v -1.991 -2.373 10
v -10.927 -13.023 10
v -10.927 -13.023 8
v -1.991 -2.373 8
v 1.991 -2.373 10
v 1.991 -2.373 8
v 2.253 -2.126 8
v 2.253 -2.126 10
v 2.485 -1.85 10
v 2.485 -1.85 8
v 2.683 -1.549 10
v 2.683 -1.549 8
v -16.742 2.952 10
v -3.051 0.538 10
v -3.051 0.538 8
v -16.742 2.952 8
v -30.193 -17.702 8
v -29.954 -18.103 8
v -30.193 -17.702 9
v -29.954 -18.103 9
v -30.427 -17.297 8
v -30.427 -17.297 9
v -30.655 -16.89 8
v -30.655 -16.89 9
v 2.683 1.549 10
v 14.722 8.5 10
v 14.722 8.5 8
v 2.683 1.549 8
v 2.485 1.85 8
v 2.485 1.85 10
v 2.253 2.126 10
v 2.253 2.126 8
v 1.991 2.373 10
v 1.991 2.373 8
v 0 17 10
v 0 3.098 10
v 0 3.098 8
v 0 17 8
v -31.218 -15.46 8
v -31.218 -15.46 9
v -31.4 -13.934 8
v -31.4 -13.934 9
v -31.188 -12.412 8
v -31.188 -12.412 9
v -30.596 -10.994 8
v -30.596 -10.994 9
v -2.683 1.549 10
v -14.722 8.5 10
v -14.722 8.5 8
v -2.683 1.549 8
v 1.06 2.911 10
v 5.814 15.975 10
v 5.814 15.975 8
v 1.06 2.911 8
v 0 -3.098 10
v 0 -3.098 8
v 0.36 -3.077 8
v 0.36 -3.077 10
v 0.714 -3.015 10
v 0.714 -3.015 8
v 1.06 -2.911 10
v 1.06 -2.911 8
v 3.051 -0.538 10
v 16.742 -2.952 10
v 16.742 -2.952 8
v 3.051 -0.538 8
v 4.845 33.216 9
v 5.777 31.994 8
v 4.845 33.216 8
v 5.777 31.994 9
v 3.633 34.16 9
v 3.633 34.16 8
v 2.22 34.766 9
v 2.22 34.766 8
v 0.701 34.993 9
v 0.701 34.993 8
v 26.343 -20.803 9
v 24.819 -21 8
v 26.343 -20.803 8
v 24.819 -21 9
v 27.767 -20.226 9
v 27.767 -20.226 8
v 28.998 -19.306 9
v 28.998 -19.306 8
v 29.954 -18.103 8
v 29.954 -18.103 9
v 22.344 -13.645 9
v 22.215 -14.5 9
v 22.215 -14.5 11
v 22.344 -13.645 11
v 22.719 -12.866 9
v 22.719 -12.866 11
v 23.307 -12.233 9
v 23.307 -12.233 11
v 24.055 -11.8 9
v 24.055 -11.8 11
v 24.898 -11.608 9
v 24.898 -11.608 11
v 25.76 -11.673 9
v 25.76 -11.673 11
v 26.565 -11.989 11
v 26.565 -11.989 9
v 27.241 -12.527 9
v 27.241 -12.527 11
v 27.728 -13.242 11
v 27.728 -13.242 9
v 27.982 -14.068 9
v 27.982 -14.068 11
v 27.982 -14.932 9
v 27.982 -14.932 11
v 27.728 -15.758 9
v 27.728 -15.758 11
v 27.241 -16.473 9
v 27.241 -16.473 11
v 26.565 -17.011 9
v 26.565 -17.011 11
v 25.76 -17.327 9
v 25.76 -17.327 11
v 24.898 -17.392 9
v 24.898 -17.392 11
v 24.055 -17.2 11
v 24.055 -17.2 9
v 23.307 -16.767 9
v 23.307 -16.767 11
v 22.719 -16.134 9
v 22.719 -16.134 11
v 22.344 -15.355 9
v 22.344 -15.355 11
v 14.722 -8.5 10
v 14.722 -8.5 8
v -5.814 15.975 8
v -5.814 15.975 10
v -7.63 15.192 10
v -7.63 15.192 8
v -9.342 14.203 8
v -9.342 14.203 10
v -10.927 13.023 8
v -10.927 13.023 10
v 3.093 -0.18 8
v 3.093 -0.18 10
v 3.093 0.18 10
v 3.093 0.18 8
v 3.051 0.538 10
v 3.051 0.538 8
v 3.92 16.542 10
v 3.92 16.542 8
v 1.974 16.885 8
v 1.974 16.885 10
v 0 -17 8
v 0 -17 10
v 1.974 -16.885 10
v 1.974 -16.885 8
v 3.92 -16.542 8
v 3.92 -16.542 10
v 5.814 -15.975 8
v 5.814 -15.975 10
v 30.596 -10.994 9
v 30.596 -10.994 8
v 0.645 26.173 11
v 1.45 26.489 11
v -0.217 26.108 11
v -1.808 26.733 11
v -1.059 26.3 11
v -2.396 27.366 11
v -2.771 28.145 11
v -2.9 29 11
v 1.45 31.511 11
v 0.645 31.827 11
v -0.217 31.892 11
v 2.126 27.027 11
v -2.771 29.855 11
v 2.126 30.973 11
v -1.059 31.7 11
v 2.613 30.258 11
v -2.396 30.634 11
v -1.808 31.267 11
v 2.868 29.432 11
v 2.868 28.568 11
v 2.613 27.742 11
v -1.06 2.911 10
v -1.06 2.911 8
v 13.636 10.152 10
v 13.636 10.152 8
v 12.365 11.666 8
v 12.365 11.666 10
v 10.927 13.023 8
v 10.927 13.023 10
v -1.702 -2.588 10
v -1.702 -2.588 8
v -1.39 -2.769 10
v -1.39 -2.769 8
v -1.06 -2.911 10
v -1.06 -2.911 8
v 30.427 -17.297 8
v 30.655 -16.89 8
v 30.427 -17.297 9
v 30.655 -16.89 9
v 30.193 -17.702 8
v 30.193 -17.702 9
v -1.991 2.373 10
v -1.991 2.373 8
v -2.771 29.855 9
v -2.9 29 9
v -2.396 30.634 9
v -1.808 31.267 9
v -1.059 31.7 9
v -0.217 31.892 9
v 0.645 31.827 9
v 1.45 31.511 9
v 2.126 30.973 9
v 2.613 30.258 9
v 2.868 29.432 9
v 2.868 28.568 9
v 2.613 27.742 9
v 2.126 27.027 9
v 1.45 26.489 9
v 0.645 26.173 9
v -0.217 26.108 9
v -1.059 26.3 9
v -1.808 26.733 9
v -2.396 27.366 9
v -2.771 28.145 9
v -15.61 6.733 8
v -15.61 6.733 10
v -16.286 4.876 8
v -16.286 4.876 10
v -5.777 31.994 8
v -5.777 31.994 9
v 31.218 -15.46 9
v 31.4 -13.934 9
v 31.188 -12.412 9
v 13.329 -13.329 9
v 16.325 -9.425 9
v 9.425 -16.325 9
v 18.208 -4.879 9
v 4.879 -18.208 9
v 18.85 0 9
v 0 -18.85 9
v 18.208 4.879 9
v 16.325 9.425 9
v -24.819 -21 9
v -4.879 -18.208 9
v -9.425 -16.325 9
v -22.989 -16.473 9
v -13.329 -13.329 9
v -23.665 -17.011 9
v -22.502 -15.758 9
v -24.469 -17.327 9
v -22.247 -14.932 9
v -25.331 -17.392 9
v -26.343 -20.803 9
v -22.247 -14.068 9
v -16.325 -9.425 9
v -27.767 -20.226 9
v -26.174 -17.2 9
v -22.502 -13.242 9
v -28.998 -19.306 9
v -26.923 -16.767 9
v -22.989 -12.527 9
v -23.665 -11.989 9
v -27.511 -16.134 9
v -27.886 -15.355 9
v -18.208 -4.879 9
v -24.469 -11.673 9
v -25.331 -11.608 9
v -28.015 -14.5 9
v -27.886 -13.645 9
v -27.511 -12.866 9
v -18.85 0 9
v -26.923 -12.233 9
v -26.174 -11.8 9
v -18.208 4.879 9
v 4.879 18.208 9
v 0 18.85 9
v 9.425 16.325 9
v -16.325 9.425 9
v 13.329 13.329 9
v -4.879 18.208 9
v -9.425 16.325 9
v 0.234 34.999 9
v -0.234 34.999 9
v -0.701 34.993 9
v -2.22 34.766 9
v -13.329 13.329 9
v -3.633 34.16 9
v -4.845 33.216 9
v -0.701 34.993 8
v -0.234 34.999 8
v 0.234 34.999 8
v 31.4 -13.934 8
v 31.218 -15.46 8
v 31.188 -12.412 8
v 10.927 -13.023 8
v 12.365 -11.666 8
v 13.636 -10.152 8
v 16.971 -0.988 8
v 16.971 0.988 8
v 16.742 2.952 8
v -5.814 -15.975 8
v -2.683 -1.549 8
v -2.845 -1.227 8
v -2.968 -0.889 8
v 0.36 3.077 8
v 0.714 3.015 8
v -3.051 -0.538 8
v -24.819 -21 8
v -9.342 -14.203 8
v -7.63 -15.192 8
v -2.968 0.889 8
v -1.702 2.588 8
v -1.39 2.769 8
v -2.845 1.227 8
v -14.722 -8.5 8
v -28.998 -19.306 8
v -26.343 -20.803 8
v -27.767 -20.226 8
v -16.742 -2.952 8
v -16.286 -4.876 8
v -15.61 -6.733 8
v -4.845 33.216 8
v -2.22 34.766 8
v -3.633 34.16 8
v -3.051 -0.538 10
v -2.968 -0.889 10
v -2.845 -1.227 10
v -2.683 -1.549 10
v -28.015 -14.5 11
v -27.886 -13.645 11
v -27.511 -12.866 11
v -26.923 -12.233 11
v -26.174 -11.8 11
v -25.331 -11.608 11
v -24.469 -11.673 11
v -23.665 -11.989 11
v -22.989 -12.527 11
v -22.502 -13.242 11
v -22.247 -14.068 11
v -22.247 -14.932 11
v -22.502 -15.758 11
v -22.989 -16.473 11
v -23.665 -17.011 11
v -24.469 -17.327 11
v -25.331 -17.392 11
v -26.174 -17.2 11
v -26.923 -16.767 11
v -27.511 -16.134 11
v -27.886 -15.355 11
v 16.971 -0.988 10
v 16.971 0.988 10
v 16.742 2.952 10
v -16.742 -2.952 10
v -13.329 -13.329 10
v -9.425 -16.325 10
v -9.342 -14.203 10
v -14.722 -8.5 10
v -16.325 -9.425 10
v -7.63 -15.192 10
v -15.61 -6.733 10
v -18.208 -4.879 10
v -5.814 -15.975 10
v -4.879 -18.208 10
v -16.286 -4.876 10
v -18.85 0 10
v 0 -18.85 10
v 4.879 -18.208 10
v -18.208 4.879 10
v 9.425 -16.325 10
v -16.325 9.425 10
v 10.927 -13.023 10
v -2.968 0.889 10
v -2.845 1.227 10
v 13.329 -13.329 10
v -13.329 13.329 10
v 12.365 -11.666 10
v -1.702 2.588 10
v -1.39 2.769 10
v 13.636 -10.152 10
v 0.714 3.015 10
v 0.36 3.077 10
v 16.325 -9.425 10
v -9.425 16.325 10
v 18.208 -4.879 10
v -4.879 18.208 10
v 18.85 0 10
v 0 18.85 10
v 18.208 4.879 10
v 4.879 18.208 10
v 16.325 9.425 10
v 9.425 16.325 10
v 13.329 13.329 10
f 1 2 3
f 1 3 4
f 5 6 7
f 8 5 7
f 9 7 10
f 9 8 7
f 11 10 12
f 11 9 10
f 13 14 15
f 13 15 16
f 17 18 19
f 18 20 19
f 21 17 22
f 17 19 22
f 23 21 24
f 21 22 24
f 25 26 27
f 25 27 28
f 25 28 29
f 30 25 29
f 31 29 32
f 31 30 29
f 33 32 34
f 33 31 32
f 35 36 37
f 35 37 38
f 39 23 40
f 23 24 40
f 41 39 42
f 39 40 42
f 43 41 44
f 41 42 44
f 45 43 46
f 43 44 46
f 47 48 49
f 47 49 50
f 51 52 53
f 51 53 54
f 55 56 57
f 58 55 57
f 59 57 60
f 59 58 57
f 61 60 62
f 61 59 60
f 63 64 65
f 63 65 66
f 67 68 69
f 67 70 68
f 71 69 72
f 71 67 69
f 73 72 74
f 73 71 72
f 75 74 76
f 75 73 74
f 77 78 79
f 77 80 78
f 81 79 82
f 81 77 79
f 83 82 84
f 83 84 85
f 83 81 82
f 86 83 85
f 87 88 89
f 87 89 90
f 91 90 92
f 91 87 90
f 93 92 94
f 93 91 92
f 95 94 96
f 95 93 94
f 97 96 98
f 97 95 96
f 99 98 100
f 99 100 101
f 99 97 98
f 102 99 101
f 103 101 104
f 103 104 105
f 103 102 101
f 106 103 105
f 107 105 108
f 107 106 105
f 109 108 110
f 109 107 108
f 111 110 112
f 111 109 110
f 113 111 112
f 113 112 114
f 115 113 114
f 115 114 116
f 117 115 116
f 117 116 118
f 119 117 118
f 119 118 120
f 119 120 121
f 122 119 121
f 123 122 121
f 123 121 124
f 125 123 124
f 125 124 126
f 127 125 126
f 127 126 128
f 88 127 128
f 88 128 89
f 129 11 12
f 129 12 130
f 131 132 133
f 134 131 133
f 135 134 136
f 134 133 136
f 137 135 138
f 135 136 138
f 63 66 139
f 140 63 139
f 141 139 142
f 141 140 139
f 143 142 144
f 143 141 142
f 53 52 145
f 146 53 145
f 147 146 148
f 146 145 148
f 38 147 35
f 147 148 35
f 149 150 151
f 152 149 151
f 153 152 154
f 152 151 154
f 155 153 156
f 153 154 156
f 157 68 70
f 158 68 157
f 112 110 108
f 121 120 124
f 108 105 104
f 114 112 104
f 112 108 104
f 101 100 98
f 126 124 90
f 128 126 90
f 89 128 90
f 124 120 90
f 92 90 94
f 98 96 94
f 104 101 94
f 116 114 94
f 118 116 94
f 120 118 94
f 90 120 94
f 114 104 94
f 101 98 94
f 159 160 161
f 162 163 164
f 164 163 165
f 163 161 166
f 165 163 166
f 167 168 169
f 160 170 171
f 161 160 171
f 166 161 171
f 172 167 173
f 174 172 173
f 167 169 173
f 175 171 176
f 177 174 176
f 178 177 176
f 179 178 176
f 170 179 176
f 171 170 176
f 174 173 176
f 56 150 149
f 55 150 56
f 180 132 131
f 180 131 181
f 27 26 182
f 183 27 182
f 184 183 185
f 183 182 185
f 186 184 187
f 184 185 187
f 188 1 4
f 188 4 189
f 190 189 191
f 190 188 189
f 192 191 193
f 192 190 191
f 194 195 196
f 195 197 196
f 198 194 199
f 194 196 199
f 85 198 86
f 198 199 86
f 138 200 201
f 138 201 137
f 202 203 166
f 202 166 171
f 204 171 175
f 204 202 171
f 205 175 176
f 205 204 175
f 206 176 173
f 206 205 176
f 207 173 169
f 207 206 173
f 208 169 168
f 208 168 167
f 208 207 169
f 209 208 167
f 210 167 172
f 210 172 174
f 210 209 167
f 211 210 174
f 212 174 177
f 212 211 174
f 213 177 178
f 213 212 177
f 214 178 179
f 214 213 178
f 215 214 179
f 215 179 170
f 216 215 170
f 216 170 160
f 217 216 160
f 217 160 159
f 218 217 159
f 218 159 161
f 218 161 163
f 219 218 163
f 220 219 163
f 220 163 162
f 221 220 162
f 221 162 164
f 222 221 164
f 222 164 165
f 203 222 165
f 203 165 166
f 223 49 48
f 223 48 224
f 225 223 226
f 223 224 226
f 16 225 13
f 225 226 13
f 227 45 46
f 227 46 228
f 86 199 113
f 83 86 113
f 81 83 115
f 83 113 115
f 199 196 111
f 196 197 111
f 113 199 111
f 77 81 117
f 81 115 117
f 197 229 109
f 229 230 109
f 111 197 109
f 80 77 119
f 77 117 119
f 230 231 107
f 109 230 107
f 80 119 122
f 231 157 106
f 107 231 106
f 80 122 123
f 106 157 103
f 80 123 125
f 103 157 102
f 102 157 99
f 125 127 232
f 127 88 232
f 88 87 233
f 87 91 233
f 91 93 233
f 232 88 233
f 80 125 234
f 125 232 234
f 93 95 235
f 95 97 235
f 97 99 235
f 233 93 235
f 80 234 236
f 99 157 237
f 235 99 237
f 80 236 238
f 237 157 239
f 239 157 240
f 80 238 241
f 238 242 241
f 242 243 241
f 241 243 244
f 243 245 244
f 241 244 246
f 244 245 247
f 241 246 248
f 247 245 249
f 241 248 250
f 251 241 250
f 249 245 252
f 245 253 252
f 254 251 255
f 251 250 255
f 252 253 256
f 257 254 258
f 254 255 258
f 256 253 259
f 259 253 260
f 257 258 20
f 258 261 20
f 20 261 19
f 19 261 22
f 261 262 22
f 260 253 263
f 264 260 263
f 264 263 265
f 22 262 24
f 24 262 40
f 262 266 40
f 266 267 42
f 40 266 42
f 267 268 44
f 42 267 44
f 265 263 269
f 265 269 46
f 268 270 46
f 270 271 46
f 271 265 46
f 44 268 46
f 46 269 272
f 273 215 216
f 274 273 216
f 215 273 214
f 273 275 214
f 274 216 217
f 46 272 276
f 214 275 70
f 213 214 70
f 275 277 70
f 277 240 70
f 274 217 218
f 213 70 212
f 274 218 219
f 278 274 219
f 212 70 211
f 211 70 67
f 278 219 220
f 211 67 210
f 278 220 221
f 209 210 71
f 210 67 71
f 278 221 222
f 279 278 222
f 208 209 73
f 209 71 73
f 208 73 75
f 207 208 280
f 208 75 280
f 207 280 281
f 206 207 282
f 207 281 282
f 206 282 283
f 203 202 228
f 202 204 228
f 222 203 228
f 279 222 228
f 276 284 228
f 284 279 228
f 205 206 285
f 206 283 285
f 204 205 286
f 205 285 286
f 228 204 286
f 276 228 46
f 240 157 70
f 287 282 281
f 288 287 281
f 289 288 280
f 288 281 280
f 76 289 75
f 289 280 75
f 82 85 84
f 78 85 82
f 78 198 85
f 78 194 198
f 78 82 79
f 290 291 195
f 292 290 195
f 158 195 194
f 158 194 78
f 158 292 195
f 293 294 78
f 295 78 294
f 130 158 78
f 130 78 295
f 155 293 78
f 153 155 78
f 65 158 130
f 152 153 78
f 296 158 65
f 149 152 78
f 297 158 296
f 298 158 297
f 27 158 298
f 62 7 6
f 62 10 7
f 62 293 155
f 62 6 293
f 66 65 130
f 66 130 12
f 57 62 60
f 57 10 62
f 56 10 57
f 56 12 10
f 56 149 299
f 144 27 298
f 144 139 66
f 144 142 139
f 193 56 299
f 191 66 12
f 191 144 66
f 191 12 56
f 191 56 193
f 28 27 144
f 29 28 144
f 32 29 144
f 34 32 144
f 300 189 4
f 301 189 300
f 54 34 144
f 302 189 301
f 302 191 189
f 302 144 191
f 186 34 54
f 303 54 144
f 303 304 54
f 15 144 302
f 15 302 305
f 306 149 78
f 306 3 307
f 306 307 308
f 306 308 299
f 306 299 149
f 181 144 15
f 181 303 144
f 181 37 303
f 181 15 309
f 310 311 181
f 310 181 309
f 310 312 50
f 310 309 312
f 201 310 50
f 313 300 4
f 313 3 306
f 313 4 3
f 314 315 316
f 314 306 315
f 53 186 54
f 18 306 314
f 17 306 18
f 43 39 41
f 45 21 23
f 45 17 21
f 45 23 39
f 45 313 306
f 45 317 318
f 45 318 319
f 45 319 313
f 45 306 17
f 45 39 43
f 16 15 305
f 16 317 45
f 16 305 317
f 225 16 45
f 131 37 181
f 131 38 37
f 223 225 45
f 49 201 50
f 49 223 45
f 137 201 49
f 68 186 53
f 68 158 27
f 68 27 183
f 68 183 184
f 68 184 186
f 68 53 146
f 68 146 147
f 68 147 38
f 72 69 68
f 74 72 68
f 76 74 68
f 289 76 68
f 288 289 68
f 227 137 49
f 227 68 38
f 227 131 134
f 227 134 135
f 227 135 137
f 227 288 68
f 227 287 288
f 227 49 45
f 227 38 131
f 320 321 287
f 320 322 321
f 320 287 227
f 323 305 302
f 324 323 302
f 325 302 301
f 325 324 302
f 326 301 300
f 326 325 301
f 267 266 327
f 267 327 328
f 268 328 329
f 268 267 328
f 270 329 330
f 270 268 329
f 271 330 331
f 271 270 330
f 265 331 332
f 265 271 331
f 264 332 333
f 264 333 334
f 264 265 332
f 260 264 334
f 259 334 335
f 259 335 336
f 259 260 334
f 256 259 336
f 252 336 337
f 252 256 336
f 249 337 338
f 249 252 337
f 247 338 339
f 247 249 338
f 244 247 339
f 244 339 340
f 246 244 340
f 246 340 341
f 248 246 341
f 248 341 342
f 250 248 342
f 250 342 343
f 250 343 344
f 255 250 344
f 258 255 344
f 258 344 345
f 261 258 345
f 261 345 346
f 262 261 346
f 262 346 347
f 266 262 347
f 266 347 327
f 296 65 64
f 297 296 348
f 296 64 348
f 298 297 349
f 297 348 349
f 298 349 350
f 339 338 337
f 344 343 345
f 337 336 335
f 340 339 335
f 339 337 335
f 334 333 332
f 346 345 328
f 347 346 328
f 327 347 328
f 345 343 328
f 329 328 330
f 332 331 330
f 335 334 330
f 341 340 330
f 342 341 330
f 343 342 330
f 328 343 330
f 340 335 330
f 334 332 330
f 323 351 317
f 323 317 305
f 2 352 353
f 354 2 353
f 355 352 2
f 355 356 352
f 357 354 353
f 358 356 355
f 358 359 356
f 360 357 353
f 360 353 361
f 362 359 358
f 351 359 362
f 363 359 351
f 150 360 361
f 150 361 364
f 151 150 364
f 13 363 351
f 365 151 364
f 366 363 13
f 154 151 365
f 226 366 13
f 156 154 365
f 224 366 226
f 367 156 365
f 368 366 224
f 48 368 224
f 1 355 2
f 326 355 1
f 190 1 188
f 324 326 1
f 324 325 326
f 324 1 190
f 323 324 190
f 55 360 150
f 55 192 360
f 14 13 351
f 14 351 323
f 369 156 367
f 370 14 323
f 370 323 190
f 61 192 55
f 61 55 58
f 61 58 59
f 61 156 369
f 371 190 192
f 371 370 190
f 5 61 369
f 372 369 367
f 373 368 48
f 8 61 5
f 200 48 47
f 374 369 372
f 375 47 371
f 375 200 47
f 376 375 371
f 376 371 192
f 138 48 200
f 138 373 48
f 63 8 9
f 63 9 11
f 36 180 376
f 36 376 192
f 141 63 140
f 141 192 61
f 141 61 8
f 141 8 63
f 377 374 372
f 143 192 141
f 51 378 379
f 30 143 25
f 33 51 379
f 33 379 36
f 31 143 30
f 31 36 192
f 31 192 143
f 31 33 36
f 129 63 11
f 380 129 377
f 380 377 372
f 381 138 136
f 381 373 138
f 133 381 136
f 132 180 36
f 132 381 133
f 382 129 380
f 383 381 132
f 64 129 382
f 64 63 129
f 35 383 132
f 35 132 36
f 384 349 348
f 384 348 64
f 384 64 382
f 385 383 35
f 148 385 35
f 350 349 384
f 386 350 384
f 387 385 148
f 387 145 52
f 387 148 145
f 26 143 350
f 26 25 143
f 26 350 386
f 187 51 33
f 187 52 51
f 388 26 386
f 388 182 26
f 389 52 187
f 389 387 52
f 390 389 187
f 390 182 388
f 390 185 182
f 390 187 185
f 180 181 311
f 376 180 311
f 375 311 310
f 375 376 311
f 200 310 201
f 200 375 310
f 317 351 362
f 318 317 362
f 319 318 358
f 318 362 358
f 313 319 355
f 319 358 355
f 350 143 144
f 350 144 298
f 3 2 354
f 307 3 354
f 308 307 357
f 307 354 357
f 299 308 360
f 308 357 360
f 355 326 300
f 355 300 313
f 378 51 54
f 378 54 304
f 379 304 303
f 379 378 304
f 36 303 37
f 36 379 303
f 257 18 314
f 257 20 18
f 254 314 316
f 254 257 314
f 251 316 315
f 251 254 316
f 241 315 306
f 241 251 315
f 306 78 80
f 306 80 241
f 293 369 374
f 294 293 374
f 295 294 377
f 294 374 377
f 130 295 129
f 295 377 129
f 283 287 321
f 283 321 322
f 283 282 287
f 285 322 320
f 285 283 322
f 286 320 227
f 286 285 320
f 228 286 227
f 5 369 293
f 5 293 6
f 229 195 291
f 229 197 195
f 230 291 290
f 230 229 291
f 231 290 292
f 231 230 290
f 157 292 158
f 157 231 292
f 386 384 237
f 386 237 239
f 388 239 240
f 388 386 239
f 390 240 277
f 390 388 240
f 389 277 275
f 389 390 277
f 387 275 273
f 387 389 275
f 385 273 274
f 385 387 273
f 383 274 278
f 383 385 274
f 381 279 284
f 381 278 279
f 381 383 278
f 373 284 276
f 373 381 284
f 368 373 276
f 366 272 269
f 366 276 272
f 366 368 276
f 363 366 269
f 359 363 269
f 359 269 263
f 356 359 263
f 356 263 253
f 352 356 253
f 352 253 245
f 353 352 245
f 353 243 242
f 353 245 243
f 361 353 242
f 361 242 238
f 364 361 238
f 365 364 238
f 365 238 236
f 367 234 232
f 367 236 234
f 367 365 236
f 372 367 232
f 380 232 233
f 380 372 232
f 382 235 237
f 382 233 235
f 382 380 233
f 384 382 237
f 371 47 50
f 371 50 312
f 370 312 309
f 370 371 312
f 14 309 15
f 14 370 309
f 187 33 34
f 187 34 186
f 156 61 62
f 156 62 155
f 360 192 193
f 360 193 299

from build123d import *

# Parameters (mm, degrees)
SKETCH2_R           = 18.85
SKETCH2_R_2         = 17
BOSS_EXTRUDE1_DEPTH = 2
SKETCH9_R           = 3.098061326
BOSS_EXTRUDE5_DEPTH = 2
BOSS_EXTRUDE2_START = -1
SKETCH3_R           = 35
SKETCH3_R_2         = 18.85
BOSS_EXTRUDE2_DEPTH = 1
SKETCH4_R           = 2.9
BOSS_EXTRUDE3_DEPTH = 3
SKETCH6_R           = 5
BOSS_EXTRUDE4_DEPTH = 1
SKETCH7_R           = 59.131365533
CUT_EXTRUDE1_DEPTH  = 10
FILLET1_R           = 6


with BuildPart() as part:
    # Sketch2 → Boss-Extrude1 (new body)
    # profile 1 of 10: a face of its own
    with BuildSketch(Plane.XY.offset(10)):
        Circle(SKETCH2_R)
        Circle(SKETCH2_R_2, mode=Mode.SUBTRACT)
    # profile 2 of 10: a face of its own
    with BuildSketch(Plane.XY.offset(10)):
        with BuildLine():
            ThreePointArc((-1.02606043, 2.819077862), (-0.520944533, 2.954423259), (0, 3))
            Line((0, 3), (0, 17))
            ThreePointArc((0, 17), (-2.95201902, 16.741731801), (-5.814342437, 15.974774553))
            Line((-5.814342437, 15.974774553), (-1.02606043, 2.819077862))
        make_face()
    # profile 3 of 10: a face of its own
    with BuildSketch(Plane.XY.offset(10)):
        with BuildLine():
            Line((5.814342437, 15.974774553), (1.02606043, 2.819077862))
            ThreePointArc((1.02606043, 2.819077862), (1.5, 2.598076211), (1.928362829, 2.298133329))
            Line((1.928362829, 2.298133329), (10.927389365, 13.022755533))
            ThreePointArc((10.927389365, 13.022755533), (8.5, 14.722431864), (5.814342437, 15.974774553))
        make_face()
    # profile 4 of 10: a face of its own
    with BuildSketch(Plane.XY.offset(10)):
        with BuildLine():
            Line((14.722431864, 8.5), (2.598076211, 1.5))
            ThreePointArc((2.598076211, 1.5), (2.819077862, 1.02606043), (2.954423259, 0.520944533))
            Line((2.954423259, 0.520944533), (16.741731801, 2.95201902))
            ThreePointArc((16.741731801, 2.95201902), (15.974774553, 5.814342437), (14.722431864, 8.5))
        make_face()
    # profile 5 of 10: a face of its own
    with BuildSketch(Plane.XY.offset(10)):
        with BuildLine():
            Line((16.741731801, -2.95201902), (2.954423259, -0.520944533))
            ThreePointArc((2.954423259, -0.520944533), (2.819077862, -1.02606043), (2.598076211, -1.5))
            Line((2.598076211, -1.5), (14.722431864, -8.5))
            ThreePointArc((14.722431864, -8.5), (15.974774553, -5.814342437), (16.741731801, -2.95201902))
        make_face()
    # profile 6 of 10: a face of its own
    with BuildSketch(Plane.XY.offset(10)):
        with BuildLine():
            Line((10.927389365, -13.022755533), (1.928362829, -2.298133329))
            ThreePointArc((1.928362829, -2.298133329), (1.5, -2.598076211), (1.02606043, -2.819077862))
            Line((1.02606043, -2.819077862), (5.814342437, -15.974774553))
            ThreePointArc((5.814342437, -15.974774553), (8.5, -14.722431864), (10.927389365, -13.022755533))
        make_face()
    # profile 7 of 10: a face of its own
    with BuildSketch(Plane.XY.offset(10)):
        with BuildLine():
            ThreePointArc((0, -3), (-0.520944533, -2.954423259), (-1.02606043, -2.819077862))
            Line((-1.02606043, -2.819077862), (-5.814342437, -15.974774553))
            ThreePointArc((-5.814342437, -15.974774553), (-2.95201902, -16.741731801), (0, -17))
            Line((0, -17), (0, -3))
        make_face()
    # profile 8 of 10: a face of its own
    with BuildSketch(Plane.XY.offset(10)):
        with BuildLine():
            ThreePointArc((-1.928362829, -2.298133329), (-2.298133329, -1.928362829), (-2.598076211, -1.5))
            Line((-2.598076211, -1.5), (-14.722431864, -8.5))
            ThreePointArc((-14.722431864, -8.5), (-13.022755533, -10.927389365), (-10.927389365, -13.022755533))
            Line((-10.927389365, -13.022755533), (-1.928362829, -2.298133329))
        make_face()
    # profile 9 of 10: a face of its own
    with BuildSketch(Plane.XY.offset(10)):
        with BuildLine():
            ThreePointArc((-2.954423259, -0.520944533), (-3, 0), (-2.954423259, 0.520944533))
            Line((-2.954423259, 0.520944533), (-16.741731801, 2.95201902))
            ThreePointArc((-16.741731801, 2.95201902), (-17, 0), (-16.741731801, -2.95201902))
            Line((-16.741731801, -2.95201902), (-2.954423259, -0.520944533))
        make_face()
    # profile 10 of 10: a face of its own
    with BuildSketch(Plane.XY.offset(10)):
        with BuildLine():
            ThreePointArc((-2.598076211, 1.5), (-2.298133329, 1.928362829), (-1.928362829, 2.298133329))
            Line((-1.928362829, 2.298133329), (-10.927389365, 13.022755533))
            ThreePointArc((-10.927389365, 13.022755533), (-13.022755533, 10.927389365), (-14.722431864, 8.5))
            Line((-14.722431864, 8.5), (-2.598076211, 1.5))
        make_face()
    extrude(amount=-BOSS_EXTRUDE1_DEPTH)

    # Sketch9 → Boss-Extrude5 (add)
    with BuildSketch(Plane.XY.offset(10)):
        Circle(SKETCH9_R)
    extrude(amount=-BOSS_EXTRUDE5_DEPTH)

    # Sketch3 → Boss-Extrude2 (add)
    with BuildSketch(Plane(origin=(0, 0, 8), x_dir=(-1, 0, 0), z_dir=(0, 0, -1)).offset(BOSS_EXTRUDE2_START)):
        Circle(SKETCH3_R)
        with Locations(Location((0, 0, 0), (0, 0, 180))):
            Circle(SKETCH3_R_2, mode=Mode.SUBTRACT)
    extrude(amount=BOSS_EXTRUDE2_DEPTH)

    # Sketch4 → Boss-Extrude3 (add)
    with BuildSketch(Plane(origin=(0, 0, 8), x_dir=(-1, 0, 0), z_dir=(0, 0, -1))):
        with Locations((0, 29)):
            Circle(SKETCH4_R)
        with Locations((25.11473671, -14.5)):
            Circle(SKETCH4_R)
        with Locations((-25.11473671, -14.5)):
            Circle(SKETCH4_R)
    extrude(amount=-BOSS_EXTRUDE3_DEPTH)

    # Sketch6 → Boss-Extrude4 (add)
    with BuildSketch(Plane(origin=(0, 0, 9), x_dir=(-1, 0, 0), z_dir=(0, 0, -1))):
        with Locations((0, 30)):
            Circle(SKETCH6_R)
        with Locations((25.980762114, -15)):
            Circle(SKETCH6_R)
        with Locations((-25.980762114, -15)):
            Circle(SKETCH6_R)
    extrude(amount=BOSS_EXTRUDE4_DEPTH)

    # Sketch7 → Cut-Extrude1 (cut)
    with BuildSketch(Plane(origin=(0, 0, 8), x_dir=(-1, 0, 0), z_dir=(0, 0, -1))):
        Circle(SKETCH7_R)
        Polygon((0, 42), (-36.373066959, -21), (36.373066959, -21), align=None, mode=Mode.SUBTRACT)
    extrude(amount=-CUT_EXTRUDE1_DEPTH, mode=Mode.SUBTRACT)

    # Fillet1
    fillet1_edges = [part.edges().sort_by_distance(p)[0] for p in [
        (-4.186533479, 34.748711306, 8.5),
        (-32.186533479, -13.748711306, 8.5),
        (-28, -21, 8.5),
        (28, -21, 8.5),
        (32.186533479, -13.748711306, 8.5),
        (4.186533479, 34.748711306, 8.5),
    ]]
    fillet(fillet1_edges, radius=FILLET1_R)


solid = part.part
